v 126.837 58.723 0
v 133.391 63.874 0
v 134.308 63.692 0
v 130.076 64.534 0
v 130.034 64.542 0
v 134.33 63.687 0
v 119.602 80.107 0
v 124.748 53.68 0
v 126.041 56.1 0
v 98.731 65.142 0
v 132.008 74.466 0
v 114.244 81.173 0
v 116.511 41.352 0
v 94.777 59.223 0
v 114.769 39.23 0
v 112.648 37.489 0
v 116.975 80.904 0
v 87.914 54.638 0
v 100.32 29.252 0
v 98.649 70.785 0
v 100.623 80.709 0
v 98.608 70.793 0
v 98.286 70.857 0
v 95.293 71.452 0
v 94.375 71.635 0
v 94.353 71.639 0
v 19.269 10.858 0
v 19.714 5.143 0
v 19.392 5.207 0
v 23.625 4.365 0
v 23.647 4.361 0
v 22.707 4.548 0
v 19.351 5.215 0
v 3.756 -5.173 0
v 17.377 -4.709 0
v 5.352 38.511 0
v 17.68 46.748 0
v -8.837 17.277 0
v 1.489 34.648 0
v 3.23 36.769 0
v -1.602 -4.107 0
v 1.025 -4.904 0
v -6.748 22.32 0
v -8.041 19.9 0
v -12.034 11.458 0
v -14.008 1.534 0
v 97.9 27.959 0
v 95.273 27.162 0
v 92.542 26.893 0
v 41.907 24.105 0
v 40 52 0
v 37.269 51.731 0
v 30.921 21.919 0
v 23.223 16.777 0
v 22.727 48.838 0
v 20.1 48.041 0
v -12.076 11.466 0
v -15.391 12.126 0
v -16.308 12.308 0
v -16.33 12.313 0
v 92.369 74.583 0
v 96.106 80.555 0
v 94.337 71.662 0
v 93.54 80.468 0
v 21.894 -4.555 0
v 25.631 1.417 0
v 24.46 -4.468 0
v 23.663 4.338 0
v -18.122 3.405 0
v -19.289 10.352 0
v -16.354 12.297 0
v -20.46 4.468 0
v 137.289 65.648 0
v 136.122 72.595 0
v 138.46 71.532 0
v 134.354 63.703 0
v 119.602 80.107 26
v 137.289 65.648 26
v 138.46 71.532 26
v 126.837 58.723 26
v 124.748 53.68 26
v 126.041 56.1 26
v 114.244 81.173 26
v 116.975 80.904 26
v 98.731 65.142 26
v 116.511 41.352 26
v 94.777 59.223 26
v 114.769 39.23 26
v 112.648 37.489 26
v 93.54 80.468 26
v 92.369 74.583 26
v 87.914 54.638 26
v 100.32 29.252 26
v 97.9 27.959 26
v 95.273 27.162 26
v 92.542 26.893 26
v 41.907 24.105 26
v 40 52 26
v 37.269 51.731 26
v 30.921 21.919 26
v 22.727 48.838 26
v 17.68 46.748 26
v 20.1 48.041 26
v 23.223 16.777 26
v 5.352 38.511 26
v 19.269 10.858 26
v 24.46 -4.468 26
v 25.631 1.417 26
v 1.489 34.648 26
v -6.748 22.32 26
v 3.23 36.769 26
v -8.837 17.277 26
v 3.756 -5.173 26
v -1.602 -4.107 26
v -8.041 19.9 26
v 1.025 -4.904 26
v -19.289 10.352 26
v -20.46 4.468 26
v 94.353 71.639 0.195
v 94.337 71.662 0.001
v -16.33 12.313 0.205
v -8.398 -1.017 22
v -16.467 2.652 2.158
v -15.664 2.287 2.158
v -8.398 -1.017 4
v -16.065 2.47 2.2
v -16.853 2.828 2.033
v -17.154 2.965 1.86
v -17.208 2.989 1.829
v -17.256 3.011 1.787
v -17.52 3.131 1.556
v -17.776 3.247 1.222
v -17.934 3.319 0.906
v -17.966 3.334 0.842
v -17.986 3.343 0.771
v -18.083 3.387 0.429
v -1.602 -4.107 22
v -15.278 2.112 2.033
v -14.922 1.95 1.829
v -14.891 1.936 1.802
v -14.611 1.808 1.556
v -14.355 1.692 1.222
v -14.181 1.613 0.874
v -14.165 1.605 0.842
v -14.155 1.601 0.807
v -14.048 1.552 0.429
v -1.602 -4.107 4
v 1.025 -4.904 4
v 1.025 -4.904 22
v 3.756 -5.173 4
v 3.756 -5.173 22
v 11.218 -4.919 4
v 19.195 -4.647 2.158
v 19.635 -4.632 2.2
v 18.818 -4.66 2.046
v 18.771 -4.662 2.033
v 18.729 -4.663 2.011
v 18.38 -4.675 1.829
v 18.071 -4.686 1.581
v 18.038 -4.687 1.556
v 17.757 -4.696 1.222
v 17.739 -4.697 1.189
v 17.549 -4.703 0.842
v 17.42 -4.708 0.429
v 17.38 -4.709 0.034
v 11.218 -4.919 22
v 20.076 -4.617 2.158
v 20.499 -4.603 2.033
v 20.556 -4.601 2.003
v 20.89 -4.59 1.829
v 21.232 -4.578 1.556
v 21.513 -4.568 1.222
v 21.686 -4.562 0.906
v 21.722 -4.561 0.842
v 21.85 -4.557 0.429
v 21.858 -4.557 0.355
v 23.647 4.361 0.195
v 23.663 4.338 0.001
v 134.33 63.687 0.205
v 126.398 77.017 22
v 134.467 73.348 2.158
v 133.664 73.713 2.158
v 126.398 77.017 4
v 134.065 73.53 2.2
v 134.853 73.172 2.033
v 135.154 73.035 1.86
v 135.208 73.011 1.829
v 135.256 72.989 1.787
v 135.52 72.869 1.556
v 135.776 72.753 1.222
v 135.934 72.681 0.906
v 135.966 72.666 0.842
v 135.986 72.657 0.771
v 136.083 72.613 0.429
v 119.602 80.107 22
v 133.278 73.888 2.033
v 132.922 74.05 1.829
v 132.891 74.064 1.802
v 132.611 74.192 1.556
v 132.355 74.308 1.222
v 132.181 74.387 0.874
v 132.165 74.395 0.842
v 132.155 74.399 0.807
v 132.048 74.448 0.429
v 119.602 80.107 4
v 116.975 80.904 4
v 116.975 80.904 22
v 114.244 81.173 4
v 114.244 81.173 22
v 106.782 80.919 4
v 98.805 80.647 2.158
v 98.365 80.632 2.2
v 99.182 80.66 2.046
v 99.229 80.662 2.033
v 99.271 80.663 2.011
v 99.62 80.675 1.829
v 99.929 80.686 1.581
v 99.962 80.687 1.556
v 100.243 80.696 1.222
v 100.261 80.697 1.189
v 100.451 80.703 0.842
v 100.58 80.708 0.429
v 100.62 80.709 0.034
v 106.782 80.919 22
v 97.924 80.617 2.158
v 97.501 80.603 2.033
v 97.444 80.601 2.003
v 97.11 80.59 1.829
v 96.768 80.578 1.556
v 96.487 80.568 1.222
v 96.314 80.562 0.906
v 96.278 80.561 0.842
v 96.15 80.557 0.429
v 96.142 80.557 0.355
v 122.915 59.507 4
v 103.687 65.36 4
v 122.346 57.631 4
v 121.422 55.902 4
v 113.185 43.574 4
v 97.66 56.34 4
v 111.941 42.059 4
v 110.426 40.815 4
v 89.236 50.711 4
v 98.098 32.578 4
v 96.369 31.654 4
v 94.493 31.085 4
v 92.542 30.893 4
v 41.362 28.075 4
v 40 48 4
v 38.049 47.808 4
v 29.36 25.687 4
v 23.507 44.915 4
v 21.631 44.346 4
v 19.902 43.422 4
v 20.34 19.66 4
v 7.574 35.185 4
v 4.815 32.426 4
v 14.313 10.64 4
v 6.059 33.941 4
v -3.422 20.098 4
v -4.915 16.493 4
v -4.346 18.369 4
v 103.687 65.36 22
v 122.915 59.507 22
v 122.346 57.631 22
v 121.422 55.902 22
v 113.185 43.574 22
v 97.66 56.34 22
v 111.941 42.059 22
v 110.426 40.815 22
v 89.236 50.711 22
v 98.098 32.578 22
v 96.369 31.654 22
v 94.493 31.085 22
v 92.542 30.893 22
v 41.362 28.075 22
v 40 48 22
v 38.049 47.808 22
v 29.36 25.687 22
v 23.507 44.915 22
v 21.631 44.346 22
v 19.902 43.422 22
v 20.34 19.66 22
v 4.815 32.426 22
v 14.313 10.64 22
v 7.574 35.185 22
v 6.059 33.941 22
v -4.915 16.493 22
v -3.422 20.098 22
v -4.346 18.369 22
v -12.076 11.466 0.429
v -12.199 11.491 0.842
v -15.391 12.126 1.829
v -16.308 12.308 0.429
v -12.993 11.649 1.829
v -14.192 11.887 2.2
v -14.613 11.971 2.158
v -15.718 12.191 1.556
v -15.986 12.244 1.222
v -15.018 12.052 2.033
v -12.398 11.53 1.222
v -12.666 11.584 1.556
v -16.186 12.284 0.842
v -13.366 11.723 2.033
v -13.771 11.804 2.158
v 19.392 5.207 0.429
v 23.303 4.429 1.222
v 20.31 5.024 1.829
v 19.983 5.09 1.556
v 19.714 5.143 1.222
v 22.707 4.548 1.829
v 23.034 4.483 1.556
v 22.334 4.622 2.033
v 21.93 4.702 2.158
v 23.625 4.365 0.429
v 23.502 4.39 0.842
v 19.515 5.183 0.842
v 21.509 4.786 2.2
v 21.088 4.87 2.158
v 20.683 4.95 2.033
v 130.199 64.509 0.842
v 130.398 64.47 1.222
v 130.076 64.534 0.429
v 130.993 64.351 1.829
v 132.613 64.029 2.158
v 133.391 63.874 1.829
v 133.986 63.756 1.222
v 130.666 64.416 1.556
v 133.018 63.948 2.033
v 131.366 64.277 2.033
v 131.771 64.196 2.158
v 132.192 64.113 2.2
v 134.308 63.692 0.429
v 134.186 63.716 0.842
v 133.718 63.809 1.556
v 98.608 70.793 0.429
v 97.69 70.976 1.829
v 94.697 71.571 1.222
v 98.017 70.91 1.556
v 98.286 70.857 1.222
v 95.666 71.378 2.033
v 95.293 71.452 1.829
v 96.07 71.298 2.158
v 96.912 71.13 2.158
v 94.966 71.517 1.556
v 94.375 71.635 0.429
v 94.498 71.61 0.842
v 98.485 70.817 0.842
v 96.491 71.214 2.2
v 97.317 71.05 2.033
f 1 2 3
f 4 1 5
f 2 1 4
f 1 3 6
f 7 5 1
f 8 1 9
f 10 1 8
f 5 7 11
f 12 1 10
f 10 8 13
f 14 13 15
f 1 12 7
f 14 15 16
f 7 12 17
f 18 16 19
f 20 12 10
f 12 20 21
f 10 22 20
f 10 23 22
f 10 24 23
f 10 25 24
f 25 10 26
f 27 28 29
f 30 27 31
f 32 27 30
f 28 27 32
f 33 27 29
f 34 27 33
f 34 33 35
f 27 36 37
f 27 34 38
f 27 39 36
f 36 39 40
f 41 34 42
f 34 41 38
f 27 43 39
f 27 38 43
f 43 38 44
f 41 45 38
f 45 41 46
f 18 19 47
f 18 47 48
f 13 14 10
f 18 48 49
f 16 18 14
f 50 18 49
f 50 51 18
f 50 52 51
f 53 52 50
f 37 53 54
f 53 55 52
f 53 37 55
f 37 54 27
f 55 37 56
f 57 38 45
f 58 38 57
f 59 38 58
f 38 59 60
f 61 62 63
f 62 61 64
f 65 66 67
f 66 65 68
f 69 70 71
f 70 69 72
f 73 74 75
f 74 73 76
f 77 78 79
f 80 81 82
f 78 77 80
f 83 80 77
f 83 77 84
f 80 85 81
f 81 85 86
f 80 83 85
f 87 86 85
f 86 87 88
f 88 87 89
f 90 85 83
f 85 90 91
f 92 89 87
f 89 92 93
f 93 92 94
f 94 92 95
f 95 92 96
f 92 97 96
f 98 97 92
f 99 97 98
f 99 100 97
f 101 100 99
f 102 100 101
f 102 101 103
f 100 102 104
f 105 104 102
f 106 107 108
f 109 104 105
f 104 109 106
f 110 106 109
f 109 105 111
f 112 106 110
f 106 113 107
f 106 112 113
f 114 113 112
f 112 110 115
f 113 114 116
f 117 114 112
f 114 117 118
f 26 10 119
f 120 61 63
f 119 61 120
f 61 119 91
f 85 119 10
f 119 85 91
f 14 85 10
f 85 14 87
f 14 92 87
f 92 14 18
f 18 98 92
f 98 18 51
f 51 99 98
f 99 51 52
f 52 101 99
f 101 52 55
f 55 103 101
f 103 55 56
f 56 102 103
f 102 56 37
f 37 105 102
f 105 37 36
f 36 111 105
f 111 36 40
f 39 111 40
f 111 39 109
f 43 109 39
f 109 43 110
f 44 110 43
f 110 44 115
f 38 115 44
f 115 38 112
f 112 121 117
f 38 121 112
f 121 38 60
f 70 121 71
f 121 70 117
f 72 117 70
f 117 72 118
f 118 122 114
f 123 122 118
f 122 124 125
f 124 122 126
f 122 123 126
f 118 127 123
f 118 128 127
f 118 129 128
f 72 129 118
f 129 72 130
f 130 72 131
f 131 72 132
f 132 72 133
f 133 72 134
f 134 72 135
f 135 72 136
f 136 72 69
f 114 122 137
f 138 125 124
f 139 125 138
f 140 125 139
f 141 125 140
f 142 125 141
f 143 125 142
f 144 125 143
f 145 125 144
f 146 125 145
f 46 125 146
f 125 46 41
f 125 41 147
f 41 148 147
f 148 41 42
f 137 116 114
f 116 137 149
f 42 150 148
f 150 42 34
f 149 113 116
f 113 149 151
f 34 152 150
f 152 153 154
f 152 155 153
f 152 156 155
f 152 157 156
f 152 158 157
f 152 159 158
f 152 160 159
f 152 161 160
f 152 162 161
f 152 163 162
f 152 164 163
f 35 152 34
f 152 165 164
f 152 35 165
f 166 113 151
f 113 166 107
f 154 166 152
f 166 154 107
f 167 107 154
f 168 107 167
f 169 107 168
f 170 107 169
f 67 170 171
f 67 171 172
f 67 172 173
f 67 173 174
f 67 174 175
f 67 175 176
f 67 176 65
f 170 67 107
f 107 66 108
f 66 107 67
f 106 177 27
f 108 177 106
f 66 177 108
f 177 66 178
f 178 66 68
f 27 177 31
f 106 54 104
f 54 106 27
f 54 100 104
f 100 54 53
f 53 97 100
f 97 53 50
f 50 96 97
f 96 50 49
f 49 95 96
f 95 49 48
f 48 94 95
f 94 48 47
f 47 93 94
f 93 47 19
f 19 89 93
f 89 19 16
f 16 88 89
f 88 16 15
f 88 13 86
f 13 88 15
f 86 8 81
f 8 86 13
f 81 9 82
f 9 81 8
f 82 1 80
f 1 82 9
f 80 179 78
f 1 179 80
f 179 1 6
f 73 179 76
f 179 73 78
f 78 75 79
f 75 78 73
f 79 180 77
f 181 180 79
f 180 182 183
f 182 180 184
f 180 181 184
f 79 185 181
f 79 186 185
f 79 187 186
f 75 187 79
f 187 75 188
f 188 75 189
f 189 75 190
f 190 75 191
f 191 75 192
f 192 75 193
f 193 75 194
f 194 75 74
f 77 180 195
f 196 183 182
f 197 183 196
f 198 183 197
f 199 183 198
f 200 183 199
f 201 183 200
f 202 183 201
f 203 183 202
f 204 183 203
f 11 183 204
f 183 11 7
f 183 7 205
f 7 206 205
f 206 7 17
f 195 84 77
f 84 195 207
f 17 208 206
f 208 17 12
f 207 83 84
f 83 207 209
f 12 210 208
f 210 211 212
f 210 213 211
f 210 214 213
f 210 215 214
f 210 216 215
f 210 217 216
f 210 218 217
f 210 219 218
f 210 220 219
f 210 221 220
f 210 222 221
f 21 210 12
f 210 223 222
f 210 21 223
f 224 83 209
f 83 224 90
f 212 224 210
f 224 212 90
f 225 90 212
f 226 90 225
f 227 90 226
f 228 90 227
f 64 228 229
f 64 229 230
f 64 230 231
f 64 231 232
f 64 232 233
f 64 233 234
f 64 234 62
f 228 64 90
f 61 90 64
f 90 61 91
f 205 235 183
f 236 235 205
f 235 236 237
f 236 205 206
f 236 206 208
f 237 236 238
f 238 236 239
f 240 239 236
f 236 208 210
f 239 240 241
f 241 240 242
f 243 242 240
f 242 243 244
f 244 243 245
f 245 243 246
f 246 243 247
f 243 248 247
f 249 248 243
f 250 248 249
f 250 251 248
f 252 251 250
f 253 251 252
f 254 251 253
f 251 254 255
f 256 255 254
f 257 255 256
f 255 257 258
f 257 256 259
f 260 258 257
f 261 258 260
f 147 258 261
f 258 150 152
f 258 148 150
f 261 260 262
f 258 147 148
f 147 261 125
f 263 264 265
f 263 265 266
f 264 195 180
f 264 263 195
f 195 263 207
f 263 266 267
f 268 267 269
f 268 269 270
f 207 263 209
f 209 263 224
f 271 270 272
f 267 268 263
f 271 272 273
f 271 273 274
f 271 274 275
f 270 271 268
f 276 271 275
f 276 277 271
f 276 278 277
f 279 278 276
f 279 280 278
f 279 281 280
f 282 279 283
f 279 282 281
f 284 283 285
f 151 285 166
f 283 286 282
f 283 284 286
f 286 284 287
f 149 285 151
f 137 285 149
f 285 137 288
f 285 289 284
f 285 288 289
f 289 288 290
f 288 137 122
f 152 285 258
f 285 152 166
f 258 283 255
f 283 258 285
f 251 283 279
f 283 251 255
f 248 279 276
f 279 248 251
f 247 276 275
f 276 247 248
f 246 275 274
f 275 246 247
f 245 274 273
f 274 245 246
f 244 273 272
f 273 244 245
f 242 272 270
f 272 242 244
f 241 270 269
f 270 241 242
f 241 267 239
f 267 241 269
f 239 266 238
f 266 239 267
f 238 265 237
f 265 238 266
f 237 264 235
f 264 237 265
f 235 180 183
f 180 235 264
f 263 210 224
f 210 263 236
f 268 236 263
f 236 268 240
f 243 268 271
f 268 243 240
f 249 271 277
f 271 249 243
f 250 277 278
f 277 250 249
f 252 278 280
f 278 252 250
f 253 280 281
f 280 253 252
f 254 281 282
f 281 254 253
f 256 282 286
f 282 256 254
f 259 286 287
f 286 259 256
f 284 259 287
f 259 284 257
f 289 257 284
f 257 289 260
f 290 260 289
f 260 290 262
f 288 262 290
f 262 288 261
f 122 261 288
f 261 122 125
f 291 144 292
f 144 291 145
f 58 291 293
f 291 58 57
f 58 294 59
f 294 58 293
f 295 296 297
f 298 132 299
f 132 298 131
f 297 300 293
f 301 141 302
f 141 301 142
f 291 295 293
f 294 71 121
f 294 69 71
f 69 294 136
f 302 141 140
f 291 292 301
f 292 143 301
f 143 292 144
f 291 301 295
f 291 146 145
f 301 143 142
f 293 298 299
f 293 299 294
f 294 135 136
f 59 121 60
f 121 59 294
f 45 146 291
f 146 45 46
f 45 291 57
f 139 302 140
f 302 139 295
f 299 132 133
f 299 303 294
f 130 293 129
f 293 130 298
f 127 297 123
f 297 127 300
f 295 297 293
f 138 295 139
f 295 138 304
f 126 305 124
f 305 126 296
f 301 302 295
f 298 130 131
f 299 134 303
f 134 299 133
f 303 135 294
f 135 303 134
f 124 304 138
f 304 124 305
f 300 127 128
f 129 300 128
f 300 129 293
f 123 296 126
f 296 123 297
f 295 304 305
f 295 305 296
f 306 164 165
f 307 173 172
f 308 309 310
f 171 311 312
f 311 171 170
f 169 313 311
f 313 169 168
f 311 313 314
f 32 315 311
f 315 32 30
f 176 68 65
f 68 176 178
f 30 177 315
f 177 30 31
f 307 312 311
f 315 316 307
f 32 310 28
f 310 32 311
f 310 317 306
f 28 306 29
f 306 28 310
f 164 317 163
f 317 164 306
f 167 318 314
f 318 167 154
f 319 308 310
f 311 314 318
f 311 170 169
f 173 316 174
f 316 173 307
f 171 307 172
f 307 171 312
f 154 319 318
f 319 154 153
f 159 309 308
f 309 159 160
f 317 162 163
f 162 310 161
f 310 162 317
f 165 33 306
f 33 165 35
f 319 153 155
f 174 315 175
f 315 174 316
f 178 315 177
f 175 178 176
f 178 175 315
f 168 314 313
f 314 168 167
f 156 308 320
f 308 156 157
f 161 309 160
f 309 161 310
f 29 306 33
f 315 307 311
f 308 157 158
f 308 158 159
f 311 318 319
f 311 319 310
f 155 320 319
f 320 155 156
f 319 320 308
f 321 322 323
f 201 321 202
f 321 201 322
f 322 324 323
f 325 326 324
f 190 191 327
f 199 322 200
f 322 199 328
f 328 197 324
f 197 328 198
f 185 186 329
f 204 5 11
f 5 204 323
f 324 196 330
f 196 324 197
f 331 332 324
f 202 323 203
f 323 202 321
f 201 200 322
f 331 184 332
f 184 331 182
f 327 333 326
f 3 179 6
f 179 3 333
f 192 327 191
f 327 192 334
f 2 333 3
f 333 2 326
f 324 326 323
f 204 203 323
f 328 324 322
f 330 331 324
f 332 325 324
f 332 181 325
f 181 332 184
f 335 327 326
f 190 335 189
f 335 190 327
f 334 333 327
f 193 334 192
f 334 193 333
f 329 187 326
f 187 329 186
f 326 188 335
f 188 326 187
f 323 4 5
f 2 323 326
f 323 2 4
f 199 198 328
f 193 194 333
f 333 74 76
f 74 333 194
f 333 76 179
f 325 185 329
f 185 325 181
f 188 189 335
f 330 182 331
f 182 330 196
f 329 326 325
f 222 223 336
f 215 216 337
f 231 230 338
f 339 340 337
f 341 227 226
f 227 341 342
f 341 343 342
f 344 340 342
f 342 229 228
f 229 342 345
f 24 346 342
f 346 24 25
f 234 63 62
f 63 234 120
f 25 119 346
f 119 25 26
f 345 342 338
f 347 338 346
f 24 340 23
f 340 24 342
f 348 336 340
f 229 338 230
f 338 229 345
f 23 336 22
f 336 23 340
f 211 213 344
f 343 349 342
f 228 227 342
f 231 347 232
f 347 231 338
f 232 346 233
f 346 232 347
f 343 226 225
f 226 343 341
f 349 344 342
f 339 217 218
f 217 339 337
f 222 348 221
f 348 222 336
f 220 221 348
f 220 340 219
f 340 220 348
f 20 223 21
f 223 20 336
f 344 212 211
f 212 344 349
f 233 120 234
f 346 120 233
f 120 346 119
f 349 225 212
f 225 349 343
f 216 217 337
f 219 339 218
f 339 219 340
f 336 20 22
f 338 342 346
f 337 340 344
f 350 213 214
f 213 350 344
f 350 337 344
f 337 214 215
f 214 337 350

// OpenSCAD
$fn = 32;

// ----------------------------------------------------------------------
// Air duct: 28 mm duct, 4 mm wall, 26 mm across
// ----------------------------------------------------------------------

// --- parameters (mm) ---
duct_r = 14;              // duct core radius
duct_d = 28;              // duct core diameter
wall = 4;                 // duct wall thickness
height = 26;              // duct width (extrusion height)
port_r = 22.9;            // port flange half width
port_d = 45.8;            // port flange width
port_t = 6;               // port flange thickness
bolt_d = 4.4;             // port bolt holes
bolt_offset = 18.2;       // bolt hole offset from the port axis

difference() {
  /* outer hull chain: tube with a flat flange plate at every port */
  linear_extrude(height = 26) {
    hull() {
      polygon([[24.46, -4.468], [-20.46, 4.468], [-19.289, 10.352], [25.631, 1.417]]);
      translate([3.756, 8.827]) circle(r = 14);
    }
    hull() {
      translate([3.756, 8.827]) circle(r = 14);
      translate([4.893, 14.542]) circle(r = 14);
    }
    hull() {
      translate([4.893, 14.542]) circle(r = 14);
      translate([13.13, 26.87]) circle(r = 14);
    }
    hull() {
      translate([13.13, 26.87]) circle(r = 14);
      translate([25.458, 35.107]) circle(r = 14);
    }
    hull() {
      translate([25.458, 35.107]) circle(r = 14);
      translate([40, 38]) circle(r = 14);
    }
    hull() {
      translate([40, 38]) circle(r = 14);
      translate([92.542, 40.893]) circle(r = 14);
    }
    hull() {
      translate([92.542, 40.893]) circle(r = 14);
      translate([104.87, 49.13]) circle(r = 14);
    }
    hull() {
      translate([104.87, 49.13]) circle(r = 14);
      translate([113.107, 61.458]) circle(r = 14);
    }
    hull() {
      translate([113.107, 61.458]) circle(r = 14);
      translate([114.244, 67.173]) circle(r = 14);
    }
    hull() {
      translate([114.244, 67.173]) circle(r = 14);
      polygon([[93.54, 80.468], [138.46, 71.532], [137.289, 65.648], [92.369, 74.583]]);
    }
  }
  /* air passage: the same chain inset by the wall, 5 mm proud of the ports */
  translate([0, 0, 4]) linear_extrude(height = 18) {
    hull() {
      translate([1.025, -4.904]) circle(r = 10);
      translate([4.893, 14.542]) circle(r = 10);
    }
    hull() {
      translate([4.893, 14.542]) circle(r = 10);
      translate([13.13, 26.87]) circle(r = 10);
    }
    hull() {
      translate([13.13, 26.87]) circle(r = 10);
      translate([25.458, 35.107]) circle(r = 10);
    }
    hull() {
      translate([25.458, 35.107]) circle(r = 10);
      translate([40, 38]) circle(r = 10);
    }
    hull() {
      translate([40, 38]) circle(r = 10);
      translate([92.542, 40.893]) circle(r = 10);
    }
    hull() {
      translate([92.542, 40.893]) circle(r = 10);
      translate([104.87, 49.13]) circle(r = 10);
    }
    hull() {
      translate([104.87, 49.13]) circle(r = 10);
      translate([113.107, 61.458]) circle(r = 10);
    }
    hull() {
      translate([113.107, 61.458]) circle(r = 10);
      translate([116.975, 80.904]) circle(r = 10);
    }
  }
  translate([2, 0]) rotate([0, 0, -11.25]) translate([-18.2, -2.5]) rotate([-90, 0, 0]) cylinder(h = 11, d = 4.4);
  translate([2, 0]) rotate([0, 0, -11.25]) translate([18.2, -2.5]) rotate([-90, 0, 0]) cylinder(h = 11, d = 4.4);
  translate([116, 76]) rotate([0, 0, 168.75]) translate([-18.2, -2.5]) rotate([-90, 0, 0]) cylinder(h = 11, d = 4.4);
  translate([116, 76]) rotate([0, 0, 168.75]) translate([18.2, -2.5]) rotate([-90, 0, 0]) cylinder(h = 11, d = 4.4);
}
